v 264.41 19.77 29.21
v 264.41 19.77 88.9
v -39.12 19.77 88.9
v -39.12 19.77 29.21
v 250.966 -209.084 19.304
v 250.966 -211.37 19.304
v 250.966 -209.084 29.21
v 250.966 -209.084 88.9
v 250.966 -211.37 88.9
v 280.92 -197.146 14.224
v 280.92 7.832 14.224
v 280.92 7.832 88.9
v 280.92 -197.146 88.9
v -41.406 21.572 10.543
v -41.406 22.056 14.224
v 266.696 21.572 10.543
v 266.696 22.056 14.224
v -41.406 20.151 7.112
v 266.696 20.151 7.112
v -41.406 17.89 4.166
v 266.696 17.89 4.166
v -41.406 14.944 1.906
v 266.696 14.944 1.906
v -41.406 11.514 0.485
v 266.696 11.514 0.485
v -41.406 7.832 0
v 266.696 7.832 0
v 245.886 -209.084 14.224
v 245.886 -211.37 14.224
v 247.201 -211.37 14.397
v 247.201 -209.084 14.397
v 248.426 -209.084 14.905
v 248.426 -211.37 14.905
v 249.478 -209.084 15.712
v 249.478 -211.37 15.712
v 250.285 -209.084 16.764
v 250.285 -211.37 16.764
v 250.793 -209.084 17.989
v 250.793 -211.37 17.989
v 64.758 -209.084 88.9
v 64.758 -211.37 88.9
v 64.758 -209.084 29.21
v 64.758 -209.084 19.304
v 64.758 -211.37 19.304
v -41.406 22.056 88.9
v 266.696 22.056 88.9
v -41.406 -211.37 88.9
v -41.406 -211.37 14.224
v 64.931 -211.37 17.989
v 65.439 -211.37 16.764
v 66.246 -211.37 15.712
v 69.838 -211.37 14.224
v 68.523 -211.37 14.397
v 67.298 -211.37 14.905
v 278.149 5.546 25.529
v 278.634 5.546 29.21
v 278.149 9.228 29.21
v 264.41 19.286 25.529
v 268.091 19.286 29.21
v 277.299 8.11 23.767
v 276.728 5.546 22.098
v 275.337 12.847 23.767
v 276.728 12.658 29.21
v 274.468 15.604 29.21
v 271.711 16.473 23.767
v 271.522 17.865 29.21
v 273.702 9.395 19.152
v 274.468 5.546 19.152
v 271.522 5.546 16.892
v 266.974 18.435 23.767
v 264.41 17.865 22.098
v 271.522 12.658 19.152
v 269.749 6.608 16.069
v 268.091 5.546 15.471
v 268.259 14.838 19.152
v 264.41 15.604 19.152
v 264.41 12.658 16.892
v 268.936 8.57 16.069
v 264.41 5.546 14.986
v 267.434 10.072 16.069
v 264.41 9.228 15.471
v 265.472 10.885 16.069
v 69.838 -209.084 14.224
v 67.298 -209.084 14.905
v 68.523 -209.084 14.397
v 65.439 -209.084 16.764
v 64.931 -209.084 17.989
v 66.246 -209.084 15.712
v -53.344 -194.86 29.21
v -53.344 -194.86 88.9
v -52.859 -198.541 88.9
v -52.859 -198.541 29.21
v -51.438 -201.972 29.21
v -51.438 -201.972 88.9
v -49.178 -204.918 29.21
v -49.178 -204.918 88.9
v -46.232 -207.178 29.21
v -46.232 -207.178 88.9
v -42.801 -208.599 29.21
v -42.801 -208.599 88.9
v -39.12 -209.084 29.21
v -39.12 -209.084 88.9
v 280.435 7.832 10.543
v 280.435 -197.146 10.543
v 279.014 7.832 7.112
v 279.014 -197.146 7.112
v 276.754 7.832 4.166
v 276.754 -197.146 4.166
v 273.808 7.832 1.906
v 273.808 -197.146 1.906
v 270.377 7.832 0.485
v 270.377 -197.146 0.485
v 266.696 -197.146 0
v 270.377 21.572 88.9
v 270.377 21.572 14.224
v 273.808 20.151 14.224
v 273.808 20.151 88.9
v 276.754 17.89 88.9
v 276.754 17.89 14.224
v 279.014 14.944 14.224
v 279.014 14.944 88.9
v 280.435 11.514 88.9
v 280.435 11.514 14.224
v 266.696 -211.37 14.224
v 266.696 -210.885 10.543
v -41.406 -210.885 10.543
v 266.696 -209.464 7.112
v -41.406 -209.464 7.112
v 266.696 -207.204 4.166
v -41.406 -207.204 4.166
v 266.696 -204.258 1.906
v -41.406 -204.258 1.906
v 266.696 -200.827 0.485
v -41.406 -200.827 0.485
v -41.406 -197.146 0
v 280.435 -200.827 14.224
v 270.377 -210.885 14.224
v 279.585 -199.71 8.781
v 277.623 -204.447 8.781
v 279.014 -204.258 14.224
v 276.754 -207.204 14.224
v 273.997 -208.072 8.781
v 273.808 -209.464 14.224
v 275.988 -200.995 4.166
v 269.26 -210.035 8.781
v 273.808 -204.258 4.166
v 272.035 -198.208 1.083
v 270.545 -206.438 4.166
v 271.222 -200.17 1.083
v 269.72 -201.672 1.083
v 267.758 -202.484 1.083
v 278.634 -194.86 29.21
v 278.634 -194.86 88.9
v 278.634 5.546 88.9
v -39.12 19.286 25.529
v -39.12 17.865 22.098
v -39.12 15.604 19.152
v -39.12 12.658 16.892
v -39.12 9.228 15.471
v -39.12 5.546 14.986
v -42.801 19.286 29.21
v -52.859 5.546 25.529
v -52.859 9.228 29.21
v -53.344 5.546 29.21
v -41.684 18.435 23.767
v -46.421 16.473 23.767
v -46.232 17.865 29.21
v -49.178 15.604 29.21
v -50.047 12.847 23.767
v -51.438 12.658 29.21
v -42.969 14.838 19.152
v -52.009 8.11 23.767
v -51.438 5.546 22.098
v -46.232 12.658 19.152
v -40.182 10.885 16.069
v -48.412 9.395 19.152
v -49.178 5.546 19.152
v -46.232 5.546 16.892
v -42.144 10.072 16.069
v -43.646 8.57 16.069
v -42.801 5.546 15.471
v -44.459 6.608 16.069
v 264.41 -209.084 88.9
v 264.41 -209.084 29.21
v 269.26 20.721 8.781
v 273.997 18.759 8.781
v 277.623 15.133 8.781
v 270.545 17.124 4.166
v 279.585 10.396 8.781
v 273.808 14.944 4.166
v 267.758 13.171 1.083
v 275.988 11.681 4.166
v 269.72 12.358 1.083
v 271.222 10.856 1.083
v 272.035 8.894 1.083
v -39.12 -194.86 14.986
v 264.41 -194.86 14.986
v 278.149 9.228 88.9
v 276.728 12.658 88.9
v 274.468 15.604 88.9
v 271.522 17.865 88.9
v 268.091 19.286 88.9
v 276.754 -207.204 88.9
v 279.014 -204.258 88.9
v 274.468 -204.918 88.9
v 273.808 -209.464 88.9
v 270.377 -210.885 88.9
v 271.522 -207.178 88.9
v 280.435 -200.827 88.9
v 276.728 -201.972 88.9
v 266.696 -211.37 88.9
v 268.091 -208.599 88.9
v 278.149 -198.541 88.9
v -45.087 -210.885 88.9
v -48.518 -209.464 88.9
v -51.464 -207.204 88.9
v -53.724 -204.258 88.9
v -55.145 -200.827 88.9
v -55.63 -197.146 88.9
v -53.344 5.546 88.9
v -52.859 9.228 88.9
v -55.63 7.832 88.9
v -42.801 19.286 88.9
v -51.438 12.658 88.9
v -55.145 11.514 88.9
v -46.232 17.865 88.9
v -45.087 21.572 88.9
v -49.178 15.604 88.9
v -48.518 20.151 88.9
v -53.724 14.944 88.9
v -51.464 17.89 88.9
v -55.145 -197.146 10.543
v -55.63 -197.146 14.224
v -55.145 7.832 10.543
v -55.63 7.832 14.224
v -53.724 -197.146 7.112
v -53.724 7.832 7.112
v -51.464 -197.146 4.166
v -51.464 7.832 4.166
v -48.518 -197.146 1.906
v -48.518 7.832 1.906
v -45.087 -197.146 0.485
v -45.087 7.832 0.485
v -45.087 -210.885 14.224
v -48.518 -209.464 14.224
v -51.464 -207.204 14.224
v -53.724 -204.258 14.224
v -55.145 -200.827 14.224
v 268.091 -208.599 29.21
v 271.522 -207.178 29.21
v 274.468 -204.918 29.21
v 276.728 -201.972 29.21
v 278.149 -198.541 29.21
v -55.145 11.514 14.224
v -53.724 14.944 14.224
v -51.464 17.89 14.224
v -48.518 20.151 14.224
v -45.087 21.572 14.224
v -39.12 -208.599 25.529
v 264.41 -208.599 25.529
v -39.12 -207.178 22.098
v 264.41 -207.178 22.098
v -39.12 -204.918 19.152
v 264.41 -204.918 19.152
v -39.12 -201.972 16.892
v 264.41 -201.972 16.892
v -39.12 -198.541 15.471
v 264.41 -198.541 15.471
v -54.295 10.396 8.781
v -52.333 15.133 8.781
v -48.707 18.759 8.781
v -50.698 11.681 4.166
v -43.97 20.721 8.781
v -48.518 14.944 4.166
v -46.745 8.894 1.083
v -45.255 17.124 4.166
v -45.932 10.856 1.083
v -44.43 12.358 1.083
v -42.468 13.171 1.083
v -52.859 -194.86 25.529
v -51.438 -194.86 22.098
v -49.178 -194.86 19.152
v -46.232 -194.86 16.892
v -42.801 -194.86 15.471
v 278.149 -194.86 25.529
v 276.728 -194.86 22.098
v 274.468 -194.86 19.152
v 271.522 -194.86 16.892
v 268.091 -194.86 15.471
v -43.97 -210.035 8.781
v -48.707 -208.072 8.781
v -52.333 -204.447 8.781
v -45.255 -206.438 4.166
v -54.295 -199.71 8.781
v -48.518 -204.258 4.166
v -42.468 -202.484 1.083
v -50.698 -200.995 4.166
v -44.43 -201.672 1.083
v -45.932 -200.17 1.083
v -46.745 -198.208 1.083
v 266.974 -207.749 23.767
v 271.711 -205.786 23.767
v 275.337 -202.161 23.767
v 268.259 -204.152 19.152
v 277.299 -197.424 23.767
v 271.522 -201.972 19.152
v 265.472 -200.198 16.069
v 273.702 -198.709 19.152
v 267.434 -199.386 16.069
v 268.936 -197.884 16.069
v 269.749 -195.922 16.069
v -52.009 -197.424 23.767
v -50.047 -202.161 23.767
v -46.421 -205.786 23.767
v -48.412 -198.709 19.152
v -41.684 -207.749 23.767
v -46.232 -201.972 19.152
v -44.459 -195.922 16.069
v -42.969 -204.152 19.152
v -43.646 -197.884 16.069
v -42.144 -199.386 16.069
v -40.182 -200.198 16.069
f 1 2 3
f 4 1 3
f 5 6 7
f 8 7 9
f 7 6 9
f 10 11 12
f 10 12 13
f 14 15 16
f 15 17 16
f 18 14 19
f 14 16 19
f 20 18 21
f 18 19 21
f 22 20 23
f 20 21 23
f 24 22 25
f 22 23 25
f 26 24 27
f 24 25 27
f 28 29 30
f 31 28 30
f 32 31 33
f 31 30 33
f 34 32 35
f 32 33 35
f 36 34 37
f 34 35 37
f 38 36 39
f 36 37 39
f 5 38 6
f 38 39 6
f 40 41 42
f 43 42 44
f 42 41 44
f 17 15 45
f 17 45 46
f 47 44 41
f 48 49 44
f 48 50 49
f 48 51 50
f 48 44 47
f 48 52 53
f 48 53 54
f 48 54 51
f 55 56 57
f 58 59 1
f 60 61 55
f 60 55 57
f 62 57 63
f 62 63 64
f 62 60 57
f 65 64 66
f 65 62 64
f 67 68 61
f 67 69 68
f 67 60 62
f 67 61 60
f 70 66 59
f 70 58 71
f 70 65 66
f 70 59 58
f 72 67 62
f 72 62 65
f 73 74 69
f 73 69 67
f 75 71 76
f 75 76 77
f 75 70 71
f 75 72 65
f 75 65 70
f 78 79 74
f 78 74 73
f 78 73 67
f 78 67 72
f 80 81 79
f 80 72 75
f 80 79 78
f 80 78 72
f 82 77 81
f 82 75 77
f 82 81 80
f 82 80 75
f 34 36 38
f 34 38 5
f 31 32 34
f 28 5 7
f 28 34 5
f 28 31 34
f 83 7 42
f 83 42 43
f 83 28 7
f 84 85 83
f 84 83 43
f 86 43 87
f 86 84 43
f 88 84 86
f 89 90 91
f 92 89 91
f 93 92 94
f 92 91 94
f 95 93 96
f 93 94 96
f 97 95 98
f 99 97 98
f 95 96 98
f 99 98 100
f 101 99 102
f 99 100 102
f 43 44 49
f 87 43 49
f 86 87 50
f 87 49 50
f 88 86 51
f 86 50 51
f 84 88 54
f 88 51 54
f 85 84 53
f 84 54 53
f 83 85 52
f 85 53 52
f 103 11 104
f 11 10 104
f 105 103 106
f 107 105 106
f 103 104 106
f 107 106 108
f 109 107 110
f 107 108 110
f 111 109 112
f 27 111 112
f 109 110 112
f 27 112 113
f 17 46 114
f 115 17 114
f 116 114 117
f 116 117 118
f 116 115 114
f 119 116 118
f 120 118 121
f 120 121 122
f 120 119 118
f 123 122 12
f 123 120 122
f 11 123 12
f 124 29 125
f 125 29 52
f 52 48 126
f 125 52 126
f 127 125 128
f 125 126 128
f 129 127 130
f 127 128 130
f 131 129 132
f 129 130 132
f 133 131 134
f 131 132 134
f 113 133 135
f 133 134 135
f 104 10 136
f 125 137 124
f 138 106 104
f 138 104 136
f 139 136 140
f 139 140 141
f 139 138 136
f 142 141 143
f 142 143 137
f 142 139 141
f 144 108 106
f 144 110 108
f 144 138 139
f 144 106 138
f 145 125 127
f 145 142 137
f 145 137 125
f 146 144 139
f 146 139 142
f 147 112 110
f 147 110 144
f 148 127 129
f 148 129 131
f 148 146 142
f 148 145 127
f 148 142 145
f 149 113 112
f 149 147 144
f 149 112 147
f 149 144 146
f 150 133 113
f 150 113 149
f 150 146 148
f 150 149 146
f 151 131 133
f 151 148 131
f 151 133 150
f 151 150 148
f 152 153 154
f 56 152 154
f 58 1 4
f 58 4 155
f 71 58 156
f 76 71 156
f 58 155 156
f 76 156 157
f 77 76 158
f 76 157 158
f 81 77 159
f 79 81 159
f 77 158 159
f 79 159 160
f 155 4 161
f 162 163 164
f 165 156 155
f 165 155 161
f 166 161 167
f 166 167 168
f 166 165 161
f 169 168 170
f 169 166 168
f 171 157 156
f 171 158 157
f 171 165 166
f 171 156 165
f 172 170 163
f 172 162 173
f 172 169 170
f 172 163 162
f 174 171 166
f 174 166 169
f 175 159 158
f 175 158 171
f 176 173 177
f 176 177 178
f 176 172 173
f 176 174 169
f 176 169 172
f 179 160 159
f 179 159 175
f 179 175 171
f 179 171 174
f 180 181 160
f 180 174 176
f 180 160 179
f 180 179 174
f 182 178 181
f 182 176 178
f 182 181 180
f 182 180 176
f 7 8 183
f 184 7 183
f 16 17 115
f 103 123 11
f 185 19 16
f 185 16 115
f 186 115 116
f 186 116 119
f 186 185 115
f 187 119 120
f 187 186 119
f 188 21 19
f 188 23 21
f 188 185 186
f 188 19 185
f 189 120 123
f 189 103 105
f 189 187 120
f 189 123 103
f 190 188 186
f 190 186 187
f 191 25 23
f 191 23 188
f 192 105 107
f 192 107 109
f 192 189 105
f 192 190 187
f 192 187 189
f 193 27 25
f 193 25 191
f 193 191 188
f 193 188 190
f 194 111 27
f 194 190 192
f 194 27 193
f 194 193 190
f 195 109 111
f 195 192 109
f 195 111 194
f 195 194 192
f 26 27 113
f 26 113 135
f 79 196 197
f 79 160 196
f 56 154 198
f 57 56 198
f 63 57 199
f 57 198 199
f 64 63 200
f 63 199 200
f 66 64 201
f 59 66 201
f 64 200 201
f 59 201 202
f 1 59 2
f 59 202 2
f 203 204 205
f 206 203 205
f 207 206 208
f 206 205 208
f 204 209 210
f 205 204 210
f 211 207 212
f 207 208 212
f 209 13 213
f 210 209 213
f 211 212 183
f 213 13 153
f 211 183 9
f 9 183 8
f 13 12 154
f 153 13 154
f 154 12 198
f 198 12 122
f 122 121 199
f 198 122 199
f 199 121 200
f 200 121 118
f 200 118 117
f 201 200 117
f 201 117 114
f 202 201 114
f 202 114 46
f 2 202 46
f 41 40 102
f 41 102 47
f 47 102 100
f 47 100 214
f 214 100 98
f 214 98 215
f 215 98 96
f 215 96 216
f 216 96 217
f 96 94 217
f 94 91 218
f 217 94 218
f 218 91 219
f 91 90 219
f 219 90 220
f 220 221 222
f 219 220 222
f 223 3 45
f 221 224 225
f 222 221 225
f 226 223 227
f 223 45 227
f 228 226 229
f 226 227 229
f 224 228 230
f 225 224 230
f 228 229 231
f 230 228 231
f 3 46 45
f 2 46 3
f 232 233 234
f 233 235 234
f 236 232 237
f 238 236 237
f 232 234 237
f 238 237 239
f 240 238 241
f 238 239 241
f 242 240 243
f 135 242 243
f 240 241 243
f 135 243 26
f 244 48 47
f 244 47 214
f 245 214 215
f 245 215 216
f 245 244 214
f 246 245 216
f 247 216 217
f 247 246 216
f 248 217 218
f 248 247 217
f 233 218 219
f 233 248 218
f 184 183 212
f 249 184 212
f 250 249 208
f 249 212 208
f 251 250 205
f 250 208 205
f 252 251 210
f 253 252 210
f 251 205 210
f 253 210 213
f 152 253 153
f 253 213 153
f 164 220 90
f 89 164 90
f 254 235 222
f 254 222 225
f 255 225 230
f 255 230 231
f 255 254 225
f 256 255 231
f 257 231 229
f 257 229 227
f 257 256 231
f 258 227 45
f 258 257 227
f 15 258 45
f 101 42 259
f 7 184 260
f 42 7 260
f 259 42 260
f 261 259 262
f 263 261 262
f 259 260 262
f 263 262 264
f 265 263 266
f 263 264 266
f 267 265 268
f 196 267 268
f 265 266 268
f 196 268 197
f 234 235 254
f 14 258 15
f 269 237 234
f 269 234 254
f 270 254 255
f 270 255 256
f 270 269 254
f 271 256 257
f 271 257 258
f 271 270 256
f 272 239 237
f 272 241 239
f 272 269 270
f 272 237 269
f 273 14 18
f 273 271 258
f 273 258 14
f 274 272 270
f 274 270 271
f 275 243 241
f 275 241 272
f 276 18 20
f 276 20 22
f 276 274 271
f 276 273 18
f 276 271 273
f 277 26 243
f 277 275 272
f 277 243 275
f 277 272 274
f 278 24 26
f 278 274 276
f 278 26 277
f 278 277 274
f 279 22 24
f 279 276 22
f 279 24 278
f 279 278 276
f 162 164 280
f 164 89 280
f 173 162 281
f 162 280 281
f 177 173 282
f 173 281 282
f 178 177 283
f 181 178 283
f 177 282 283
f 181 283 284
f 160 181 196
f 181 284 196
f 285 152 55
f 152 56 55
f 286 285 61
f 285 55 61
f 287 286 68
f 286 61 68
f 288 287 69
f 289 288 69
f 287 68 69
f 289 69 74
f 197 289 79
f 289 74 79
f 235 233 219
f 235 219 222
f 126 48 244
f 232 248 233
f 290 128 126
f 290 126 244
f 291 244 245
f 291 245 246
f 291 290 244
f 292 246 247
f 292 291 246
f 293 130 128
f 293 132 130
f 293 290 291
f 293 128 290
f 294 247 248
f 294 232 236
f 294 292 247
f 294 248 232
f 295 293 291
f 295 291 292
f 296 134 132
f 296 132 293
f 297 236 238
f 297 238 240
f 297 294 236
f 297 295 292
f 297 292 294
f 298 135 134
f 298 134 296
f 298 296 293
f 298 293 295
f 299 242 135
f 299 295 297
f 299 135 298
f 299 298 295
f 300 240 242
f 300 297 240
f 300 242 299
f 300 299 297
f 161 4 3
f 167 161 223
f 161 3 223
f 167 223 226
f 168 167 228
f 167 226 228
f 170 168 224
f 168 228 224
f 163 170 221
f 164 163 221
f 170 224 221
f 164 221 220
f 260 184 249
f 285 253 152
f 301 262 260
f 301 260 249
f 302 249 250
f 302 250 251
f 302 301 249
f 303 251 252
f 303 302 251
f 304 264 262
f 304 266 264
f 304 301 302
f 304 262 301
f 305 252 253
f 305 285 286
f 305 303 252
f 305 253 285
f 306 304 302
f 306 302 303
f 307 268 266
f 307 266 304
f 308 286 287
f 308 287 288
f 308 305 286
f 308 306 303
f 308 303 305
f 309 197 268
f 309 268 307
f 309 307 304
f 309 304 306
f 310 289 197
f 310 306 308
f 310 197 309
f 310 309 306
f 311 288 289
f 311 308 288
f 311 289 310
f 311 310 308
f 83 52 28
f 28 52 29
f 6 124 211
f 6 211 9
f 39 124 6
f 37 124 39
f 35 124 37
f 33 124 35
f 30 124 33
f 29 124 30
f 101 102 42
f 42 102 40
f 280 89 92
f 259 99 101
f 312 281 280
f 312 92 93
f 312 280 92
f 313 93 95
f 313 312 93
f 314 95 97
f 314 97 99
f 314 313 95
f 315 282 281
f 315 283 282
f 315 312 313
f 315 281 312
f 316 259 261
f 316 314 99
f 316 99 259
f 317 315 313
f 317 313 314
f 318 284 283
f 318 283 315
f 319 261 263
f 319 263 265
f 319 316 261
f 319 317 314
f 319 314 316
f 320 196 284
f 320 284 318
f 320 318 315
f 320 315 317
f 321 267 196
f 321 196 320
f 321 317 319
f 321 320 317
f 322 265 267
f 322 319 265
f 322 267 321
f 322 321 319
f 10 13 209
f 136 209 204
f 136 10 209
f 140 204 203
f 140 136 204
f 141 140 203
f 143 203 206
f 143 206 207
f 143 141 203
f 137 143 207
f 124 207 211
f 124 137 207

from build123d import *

# Parameters (mm, degrees)
BOSS_EXTRUDE1_DEPTH = 88.9
CUT_EXTRUDE1_DEPTH  = 73.914
FILLET1_R           = 14.224
FILLET2_R           = 14.224
CUT_EXTRUDE2_DEPTH  = 2.286


with BuildPart() as part:
    # Sketch1 → Boss-Extrude1 (new body)
    with BuildSketch(Plane.XY):
        with BuildLine():
            Line((-41.405944168, 22.056216238), (266.696055832, 22.056216238))
            ThreePointArc((266.696055832, 22.056216238), (276.753942688, 17.890103094), (280.920055832, 7.832216238))
            Line((280.920055832, 7.832216238), (280.920055832, -197.145783762))
            ThreePointArc((280.920055832, -197.145783762), (276.753942688, -207.203670617), (266.696055832, -211.369783762))
            Line((266.696055832, -211.369783762), (-41.405944168, -211.369783762))
            ThreePointArc((-41.405944168, -211.369783762), (-51.463831024, -207.203670617), (-55.629944168, -197.145783762))
            Line((-55.629944168, -197.145783762), (-55.629944168, 7.832216238))
            ThreePointArc((-55.629944168, 7.832216238), (-51.463831024, 17.890103094), (-41.405944168, 22.056216238))
        make_face()
    extrude(amount=BOSS_EXTRUDE1_DEPTH)

    # Sketch4 → Cut-Extrude1 (cut)
    with BuildSketch(Plane.XY.offset(88.9)):
        with BuildLine():
            Line((-39.119944168, -209.083783762), (264.410055832, -209.083783762))
            ThreePointArc((264.410055832, -209.083783762), (274.467942688, -204.917670617), (278.634055832, -194.859783762))
            Line((278.634055832, -194.859783762), (278.634055832, 5.546216238))
            ThreePointArc((278.634055832, 5.546216238), (274.467942688, 15.604103094), (264.410055832, 19.770216238))
            Line((264.410055832, 19.770216238), (-39.119944168, 19.770216238))
            ThreePointArc((-39.119944168, 19.770216238), (-49.177831024, 15.604103094), (-53.343944168, 5.546216238))
            Line((-53.343944168, 5.546216238), (-53.343944168, -194.859783762))
            ThreePointArc((-53.343944168, -194.859783762), (-49.177831024, -204.917670617), (-39.119944168, -209.083783762))
        make_face()
    extrude(amount=-CUT_EXTRUDE1_DEPTH, mode=Mode.SUBTRACT)

    # Fillet1
    fillet1_edges = [part.edges().sort_by_distance(p)[0] for p in [
        (-49.177831024, -204.917670617, 14.986),
        (-53.343944168, -94.656783762, 14.986),
        (-49.177831024, 15.604103094, 14.986),
        (112.645055832, 19.770216238, 14.986),
        (274.467942688, 15.604103094, 14.986),
        (278.634055832, -94.656783762, 14.986),
        (274.467942688, -204.917670617, 14.986),
        (112.645055832, -209.083783762, 14.986),
    ]]
    fillet(fillet1_edges, radius=FILLET1_R)

    # Fillet2
    fillet2_edges = [part.edges().sort_by_distance(p)[0] for p in [
        (-55.629944168, -94.656783762, 0),
        (-51.463831024, 17.890103094, 0),
        (112.645055832, 22.056216238, 0),
        (276.753942688, 17.890103094, 0),
        (280.920055832, -94.656783762, 0),
        (276.753942688, -207.203670617, 0),
        (112.645055832, -211.369783762, 0),
        (-51.463831024, -207.203670617, 0),
    ]]
    fillet(fillet2_edges, radius=FILLET2_R)

    # Sketch5 → Cut-Extrude2 (cut)
    with BuildSketch(Plane(origin=(0, -211.369783762, 0), x_dir=(-1, 0, 0), z_dir=(0, -1, 0))):
        with BuildLine():
            Line((-69.838151491, -14.224), (-245.885767903, -14.224))
            ThreePointArc((-245.885767903, -14.224), (-249.477870351, -15.711897552), (-250.965767903, -19.304))
            Line((-250.965767903, -19.304), (-250.965767903, -88.9))
            Line((-250.965767903, -88.9), (-64.758151491, -88.9))
            Line((-64.758151491, -88.9), (-64.758151491, -19.304))
            ThreePointArc((-64.758151491, -19.304), (-66.246049042, -15.711897552), (-69.838151491, -14.224))
        make_face()
    extrude(amount=-CUT_EXTRUDE2_DEPTH, mode=Mode.SUBTRACT)


solid = part.part
